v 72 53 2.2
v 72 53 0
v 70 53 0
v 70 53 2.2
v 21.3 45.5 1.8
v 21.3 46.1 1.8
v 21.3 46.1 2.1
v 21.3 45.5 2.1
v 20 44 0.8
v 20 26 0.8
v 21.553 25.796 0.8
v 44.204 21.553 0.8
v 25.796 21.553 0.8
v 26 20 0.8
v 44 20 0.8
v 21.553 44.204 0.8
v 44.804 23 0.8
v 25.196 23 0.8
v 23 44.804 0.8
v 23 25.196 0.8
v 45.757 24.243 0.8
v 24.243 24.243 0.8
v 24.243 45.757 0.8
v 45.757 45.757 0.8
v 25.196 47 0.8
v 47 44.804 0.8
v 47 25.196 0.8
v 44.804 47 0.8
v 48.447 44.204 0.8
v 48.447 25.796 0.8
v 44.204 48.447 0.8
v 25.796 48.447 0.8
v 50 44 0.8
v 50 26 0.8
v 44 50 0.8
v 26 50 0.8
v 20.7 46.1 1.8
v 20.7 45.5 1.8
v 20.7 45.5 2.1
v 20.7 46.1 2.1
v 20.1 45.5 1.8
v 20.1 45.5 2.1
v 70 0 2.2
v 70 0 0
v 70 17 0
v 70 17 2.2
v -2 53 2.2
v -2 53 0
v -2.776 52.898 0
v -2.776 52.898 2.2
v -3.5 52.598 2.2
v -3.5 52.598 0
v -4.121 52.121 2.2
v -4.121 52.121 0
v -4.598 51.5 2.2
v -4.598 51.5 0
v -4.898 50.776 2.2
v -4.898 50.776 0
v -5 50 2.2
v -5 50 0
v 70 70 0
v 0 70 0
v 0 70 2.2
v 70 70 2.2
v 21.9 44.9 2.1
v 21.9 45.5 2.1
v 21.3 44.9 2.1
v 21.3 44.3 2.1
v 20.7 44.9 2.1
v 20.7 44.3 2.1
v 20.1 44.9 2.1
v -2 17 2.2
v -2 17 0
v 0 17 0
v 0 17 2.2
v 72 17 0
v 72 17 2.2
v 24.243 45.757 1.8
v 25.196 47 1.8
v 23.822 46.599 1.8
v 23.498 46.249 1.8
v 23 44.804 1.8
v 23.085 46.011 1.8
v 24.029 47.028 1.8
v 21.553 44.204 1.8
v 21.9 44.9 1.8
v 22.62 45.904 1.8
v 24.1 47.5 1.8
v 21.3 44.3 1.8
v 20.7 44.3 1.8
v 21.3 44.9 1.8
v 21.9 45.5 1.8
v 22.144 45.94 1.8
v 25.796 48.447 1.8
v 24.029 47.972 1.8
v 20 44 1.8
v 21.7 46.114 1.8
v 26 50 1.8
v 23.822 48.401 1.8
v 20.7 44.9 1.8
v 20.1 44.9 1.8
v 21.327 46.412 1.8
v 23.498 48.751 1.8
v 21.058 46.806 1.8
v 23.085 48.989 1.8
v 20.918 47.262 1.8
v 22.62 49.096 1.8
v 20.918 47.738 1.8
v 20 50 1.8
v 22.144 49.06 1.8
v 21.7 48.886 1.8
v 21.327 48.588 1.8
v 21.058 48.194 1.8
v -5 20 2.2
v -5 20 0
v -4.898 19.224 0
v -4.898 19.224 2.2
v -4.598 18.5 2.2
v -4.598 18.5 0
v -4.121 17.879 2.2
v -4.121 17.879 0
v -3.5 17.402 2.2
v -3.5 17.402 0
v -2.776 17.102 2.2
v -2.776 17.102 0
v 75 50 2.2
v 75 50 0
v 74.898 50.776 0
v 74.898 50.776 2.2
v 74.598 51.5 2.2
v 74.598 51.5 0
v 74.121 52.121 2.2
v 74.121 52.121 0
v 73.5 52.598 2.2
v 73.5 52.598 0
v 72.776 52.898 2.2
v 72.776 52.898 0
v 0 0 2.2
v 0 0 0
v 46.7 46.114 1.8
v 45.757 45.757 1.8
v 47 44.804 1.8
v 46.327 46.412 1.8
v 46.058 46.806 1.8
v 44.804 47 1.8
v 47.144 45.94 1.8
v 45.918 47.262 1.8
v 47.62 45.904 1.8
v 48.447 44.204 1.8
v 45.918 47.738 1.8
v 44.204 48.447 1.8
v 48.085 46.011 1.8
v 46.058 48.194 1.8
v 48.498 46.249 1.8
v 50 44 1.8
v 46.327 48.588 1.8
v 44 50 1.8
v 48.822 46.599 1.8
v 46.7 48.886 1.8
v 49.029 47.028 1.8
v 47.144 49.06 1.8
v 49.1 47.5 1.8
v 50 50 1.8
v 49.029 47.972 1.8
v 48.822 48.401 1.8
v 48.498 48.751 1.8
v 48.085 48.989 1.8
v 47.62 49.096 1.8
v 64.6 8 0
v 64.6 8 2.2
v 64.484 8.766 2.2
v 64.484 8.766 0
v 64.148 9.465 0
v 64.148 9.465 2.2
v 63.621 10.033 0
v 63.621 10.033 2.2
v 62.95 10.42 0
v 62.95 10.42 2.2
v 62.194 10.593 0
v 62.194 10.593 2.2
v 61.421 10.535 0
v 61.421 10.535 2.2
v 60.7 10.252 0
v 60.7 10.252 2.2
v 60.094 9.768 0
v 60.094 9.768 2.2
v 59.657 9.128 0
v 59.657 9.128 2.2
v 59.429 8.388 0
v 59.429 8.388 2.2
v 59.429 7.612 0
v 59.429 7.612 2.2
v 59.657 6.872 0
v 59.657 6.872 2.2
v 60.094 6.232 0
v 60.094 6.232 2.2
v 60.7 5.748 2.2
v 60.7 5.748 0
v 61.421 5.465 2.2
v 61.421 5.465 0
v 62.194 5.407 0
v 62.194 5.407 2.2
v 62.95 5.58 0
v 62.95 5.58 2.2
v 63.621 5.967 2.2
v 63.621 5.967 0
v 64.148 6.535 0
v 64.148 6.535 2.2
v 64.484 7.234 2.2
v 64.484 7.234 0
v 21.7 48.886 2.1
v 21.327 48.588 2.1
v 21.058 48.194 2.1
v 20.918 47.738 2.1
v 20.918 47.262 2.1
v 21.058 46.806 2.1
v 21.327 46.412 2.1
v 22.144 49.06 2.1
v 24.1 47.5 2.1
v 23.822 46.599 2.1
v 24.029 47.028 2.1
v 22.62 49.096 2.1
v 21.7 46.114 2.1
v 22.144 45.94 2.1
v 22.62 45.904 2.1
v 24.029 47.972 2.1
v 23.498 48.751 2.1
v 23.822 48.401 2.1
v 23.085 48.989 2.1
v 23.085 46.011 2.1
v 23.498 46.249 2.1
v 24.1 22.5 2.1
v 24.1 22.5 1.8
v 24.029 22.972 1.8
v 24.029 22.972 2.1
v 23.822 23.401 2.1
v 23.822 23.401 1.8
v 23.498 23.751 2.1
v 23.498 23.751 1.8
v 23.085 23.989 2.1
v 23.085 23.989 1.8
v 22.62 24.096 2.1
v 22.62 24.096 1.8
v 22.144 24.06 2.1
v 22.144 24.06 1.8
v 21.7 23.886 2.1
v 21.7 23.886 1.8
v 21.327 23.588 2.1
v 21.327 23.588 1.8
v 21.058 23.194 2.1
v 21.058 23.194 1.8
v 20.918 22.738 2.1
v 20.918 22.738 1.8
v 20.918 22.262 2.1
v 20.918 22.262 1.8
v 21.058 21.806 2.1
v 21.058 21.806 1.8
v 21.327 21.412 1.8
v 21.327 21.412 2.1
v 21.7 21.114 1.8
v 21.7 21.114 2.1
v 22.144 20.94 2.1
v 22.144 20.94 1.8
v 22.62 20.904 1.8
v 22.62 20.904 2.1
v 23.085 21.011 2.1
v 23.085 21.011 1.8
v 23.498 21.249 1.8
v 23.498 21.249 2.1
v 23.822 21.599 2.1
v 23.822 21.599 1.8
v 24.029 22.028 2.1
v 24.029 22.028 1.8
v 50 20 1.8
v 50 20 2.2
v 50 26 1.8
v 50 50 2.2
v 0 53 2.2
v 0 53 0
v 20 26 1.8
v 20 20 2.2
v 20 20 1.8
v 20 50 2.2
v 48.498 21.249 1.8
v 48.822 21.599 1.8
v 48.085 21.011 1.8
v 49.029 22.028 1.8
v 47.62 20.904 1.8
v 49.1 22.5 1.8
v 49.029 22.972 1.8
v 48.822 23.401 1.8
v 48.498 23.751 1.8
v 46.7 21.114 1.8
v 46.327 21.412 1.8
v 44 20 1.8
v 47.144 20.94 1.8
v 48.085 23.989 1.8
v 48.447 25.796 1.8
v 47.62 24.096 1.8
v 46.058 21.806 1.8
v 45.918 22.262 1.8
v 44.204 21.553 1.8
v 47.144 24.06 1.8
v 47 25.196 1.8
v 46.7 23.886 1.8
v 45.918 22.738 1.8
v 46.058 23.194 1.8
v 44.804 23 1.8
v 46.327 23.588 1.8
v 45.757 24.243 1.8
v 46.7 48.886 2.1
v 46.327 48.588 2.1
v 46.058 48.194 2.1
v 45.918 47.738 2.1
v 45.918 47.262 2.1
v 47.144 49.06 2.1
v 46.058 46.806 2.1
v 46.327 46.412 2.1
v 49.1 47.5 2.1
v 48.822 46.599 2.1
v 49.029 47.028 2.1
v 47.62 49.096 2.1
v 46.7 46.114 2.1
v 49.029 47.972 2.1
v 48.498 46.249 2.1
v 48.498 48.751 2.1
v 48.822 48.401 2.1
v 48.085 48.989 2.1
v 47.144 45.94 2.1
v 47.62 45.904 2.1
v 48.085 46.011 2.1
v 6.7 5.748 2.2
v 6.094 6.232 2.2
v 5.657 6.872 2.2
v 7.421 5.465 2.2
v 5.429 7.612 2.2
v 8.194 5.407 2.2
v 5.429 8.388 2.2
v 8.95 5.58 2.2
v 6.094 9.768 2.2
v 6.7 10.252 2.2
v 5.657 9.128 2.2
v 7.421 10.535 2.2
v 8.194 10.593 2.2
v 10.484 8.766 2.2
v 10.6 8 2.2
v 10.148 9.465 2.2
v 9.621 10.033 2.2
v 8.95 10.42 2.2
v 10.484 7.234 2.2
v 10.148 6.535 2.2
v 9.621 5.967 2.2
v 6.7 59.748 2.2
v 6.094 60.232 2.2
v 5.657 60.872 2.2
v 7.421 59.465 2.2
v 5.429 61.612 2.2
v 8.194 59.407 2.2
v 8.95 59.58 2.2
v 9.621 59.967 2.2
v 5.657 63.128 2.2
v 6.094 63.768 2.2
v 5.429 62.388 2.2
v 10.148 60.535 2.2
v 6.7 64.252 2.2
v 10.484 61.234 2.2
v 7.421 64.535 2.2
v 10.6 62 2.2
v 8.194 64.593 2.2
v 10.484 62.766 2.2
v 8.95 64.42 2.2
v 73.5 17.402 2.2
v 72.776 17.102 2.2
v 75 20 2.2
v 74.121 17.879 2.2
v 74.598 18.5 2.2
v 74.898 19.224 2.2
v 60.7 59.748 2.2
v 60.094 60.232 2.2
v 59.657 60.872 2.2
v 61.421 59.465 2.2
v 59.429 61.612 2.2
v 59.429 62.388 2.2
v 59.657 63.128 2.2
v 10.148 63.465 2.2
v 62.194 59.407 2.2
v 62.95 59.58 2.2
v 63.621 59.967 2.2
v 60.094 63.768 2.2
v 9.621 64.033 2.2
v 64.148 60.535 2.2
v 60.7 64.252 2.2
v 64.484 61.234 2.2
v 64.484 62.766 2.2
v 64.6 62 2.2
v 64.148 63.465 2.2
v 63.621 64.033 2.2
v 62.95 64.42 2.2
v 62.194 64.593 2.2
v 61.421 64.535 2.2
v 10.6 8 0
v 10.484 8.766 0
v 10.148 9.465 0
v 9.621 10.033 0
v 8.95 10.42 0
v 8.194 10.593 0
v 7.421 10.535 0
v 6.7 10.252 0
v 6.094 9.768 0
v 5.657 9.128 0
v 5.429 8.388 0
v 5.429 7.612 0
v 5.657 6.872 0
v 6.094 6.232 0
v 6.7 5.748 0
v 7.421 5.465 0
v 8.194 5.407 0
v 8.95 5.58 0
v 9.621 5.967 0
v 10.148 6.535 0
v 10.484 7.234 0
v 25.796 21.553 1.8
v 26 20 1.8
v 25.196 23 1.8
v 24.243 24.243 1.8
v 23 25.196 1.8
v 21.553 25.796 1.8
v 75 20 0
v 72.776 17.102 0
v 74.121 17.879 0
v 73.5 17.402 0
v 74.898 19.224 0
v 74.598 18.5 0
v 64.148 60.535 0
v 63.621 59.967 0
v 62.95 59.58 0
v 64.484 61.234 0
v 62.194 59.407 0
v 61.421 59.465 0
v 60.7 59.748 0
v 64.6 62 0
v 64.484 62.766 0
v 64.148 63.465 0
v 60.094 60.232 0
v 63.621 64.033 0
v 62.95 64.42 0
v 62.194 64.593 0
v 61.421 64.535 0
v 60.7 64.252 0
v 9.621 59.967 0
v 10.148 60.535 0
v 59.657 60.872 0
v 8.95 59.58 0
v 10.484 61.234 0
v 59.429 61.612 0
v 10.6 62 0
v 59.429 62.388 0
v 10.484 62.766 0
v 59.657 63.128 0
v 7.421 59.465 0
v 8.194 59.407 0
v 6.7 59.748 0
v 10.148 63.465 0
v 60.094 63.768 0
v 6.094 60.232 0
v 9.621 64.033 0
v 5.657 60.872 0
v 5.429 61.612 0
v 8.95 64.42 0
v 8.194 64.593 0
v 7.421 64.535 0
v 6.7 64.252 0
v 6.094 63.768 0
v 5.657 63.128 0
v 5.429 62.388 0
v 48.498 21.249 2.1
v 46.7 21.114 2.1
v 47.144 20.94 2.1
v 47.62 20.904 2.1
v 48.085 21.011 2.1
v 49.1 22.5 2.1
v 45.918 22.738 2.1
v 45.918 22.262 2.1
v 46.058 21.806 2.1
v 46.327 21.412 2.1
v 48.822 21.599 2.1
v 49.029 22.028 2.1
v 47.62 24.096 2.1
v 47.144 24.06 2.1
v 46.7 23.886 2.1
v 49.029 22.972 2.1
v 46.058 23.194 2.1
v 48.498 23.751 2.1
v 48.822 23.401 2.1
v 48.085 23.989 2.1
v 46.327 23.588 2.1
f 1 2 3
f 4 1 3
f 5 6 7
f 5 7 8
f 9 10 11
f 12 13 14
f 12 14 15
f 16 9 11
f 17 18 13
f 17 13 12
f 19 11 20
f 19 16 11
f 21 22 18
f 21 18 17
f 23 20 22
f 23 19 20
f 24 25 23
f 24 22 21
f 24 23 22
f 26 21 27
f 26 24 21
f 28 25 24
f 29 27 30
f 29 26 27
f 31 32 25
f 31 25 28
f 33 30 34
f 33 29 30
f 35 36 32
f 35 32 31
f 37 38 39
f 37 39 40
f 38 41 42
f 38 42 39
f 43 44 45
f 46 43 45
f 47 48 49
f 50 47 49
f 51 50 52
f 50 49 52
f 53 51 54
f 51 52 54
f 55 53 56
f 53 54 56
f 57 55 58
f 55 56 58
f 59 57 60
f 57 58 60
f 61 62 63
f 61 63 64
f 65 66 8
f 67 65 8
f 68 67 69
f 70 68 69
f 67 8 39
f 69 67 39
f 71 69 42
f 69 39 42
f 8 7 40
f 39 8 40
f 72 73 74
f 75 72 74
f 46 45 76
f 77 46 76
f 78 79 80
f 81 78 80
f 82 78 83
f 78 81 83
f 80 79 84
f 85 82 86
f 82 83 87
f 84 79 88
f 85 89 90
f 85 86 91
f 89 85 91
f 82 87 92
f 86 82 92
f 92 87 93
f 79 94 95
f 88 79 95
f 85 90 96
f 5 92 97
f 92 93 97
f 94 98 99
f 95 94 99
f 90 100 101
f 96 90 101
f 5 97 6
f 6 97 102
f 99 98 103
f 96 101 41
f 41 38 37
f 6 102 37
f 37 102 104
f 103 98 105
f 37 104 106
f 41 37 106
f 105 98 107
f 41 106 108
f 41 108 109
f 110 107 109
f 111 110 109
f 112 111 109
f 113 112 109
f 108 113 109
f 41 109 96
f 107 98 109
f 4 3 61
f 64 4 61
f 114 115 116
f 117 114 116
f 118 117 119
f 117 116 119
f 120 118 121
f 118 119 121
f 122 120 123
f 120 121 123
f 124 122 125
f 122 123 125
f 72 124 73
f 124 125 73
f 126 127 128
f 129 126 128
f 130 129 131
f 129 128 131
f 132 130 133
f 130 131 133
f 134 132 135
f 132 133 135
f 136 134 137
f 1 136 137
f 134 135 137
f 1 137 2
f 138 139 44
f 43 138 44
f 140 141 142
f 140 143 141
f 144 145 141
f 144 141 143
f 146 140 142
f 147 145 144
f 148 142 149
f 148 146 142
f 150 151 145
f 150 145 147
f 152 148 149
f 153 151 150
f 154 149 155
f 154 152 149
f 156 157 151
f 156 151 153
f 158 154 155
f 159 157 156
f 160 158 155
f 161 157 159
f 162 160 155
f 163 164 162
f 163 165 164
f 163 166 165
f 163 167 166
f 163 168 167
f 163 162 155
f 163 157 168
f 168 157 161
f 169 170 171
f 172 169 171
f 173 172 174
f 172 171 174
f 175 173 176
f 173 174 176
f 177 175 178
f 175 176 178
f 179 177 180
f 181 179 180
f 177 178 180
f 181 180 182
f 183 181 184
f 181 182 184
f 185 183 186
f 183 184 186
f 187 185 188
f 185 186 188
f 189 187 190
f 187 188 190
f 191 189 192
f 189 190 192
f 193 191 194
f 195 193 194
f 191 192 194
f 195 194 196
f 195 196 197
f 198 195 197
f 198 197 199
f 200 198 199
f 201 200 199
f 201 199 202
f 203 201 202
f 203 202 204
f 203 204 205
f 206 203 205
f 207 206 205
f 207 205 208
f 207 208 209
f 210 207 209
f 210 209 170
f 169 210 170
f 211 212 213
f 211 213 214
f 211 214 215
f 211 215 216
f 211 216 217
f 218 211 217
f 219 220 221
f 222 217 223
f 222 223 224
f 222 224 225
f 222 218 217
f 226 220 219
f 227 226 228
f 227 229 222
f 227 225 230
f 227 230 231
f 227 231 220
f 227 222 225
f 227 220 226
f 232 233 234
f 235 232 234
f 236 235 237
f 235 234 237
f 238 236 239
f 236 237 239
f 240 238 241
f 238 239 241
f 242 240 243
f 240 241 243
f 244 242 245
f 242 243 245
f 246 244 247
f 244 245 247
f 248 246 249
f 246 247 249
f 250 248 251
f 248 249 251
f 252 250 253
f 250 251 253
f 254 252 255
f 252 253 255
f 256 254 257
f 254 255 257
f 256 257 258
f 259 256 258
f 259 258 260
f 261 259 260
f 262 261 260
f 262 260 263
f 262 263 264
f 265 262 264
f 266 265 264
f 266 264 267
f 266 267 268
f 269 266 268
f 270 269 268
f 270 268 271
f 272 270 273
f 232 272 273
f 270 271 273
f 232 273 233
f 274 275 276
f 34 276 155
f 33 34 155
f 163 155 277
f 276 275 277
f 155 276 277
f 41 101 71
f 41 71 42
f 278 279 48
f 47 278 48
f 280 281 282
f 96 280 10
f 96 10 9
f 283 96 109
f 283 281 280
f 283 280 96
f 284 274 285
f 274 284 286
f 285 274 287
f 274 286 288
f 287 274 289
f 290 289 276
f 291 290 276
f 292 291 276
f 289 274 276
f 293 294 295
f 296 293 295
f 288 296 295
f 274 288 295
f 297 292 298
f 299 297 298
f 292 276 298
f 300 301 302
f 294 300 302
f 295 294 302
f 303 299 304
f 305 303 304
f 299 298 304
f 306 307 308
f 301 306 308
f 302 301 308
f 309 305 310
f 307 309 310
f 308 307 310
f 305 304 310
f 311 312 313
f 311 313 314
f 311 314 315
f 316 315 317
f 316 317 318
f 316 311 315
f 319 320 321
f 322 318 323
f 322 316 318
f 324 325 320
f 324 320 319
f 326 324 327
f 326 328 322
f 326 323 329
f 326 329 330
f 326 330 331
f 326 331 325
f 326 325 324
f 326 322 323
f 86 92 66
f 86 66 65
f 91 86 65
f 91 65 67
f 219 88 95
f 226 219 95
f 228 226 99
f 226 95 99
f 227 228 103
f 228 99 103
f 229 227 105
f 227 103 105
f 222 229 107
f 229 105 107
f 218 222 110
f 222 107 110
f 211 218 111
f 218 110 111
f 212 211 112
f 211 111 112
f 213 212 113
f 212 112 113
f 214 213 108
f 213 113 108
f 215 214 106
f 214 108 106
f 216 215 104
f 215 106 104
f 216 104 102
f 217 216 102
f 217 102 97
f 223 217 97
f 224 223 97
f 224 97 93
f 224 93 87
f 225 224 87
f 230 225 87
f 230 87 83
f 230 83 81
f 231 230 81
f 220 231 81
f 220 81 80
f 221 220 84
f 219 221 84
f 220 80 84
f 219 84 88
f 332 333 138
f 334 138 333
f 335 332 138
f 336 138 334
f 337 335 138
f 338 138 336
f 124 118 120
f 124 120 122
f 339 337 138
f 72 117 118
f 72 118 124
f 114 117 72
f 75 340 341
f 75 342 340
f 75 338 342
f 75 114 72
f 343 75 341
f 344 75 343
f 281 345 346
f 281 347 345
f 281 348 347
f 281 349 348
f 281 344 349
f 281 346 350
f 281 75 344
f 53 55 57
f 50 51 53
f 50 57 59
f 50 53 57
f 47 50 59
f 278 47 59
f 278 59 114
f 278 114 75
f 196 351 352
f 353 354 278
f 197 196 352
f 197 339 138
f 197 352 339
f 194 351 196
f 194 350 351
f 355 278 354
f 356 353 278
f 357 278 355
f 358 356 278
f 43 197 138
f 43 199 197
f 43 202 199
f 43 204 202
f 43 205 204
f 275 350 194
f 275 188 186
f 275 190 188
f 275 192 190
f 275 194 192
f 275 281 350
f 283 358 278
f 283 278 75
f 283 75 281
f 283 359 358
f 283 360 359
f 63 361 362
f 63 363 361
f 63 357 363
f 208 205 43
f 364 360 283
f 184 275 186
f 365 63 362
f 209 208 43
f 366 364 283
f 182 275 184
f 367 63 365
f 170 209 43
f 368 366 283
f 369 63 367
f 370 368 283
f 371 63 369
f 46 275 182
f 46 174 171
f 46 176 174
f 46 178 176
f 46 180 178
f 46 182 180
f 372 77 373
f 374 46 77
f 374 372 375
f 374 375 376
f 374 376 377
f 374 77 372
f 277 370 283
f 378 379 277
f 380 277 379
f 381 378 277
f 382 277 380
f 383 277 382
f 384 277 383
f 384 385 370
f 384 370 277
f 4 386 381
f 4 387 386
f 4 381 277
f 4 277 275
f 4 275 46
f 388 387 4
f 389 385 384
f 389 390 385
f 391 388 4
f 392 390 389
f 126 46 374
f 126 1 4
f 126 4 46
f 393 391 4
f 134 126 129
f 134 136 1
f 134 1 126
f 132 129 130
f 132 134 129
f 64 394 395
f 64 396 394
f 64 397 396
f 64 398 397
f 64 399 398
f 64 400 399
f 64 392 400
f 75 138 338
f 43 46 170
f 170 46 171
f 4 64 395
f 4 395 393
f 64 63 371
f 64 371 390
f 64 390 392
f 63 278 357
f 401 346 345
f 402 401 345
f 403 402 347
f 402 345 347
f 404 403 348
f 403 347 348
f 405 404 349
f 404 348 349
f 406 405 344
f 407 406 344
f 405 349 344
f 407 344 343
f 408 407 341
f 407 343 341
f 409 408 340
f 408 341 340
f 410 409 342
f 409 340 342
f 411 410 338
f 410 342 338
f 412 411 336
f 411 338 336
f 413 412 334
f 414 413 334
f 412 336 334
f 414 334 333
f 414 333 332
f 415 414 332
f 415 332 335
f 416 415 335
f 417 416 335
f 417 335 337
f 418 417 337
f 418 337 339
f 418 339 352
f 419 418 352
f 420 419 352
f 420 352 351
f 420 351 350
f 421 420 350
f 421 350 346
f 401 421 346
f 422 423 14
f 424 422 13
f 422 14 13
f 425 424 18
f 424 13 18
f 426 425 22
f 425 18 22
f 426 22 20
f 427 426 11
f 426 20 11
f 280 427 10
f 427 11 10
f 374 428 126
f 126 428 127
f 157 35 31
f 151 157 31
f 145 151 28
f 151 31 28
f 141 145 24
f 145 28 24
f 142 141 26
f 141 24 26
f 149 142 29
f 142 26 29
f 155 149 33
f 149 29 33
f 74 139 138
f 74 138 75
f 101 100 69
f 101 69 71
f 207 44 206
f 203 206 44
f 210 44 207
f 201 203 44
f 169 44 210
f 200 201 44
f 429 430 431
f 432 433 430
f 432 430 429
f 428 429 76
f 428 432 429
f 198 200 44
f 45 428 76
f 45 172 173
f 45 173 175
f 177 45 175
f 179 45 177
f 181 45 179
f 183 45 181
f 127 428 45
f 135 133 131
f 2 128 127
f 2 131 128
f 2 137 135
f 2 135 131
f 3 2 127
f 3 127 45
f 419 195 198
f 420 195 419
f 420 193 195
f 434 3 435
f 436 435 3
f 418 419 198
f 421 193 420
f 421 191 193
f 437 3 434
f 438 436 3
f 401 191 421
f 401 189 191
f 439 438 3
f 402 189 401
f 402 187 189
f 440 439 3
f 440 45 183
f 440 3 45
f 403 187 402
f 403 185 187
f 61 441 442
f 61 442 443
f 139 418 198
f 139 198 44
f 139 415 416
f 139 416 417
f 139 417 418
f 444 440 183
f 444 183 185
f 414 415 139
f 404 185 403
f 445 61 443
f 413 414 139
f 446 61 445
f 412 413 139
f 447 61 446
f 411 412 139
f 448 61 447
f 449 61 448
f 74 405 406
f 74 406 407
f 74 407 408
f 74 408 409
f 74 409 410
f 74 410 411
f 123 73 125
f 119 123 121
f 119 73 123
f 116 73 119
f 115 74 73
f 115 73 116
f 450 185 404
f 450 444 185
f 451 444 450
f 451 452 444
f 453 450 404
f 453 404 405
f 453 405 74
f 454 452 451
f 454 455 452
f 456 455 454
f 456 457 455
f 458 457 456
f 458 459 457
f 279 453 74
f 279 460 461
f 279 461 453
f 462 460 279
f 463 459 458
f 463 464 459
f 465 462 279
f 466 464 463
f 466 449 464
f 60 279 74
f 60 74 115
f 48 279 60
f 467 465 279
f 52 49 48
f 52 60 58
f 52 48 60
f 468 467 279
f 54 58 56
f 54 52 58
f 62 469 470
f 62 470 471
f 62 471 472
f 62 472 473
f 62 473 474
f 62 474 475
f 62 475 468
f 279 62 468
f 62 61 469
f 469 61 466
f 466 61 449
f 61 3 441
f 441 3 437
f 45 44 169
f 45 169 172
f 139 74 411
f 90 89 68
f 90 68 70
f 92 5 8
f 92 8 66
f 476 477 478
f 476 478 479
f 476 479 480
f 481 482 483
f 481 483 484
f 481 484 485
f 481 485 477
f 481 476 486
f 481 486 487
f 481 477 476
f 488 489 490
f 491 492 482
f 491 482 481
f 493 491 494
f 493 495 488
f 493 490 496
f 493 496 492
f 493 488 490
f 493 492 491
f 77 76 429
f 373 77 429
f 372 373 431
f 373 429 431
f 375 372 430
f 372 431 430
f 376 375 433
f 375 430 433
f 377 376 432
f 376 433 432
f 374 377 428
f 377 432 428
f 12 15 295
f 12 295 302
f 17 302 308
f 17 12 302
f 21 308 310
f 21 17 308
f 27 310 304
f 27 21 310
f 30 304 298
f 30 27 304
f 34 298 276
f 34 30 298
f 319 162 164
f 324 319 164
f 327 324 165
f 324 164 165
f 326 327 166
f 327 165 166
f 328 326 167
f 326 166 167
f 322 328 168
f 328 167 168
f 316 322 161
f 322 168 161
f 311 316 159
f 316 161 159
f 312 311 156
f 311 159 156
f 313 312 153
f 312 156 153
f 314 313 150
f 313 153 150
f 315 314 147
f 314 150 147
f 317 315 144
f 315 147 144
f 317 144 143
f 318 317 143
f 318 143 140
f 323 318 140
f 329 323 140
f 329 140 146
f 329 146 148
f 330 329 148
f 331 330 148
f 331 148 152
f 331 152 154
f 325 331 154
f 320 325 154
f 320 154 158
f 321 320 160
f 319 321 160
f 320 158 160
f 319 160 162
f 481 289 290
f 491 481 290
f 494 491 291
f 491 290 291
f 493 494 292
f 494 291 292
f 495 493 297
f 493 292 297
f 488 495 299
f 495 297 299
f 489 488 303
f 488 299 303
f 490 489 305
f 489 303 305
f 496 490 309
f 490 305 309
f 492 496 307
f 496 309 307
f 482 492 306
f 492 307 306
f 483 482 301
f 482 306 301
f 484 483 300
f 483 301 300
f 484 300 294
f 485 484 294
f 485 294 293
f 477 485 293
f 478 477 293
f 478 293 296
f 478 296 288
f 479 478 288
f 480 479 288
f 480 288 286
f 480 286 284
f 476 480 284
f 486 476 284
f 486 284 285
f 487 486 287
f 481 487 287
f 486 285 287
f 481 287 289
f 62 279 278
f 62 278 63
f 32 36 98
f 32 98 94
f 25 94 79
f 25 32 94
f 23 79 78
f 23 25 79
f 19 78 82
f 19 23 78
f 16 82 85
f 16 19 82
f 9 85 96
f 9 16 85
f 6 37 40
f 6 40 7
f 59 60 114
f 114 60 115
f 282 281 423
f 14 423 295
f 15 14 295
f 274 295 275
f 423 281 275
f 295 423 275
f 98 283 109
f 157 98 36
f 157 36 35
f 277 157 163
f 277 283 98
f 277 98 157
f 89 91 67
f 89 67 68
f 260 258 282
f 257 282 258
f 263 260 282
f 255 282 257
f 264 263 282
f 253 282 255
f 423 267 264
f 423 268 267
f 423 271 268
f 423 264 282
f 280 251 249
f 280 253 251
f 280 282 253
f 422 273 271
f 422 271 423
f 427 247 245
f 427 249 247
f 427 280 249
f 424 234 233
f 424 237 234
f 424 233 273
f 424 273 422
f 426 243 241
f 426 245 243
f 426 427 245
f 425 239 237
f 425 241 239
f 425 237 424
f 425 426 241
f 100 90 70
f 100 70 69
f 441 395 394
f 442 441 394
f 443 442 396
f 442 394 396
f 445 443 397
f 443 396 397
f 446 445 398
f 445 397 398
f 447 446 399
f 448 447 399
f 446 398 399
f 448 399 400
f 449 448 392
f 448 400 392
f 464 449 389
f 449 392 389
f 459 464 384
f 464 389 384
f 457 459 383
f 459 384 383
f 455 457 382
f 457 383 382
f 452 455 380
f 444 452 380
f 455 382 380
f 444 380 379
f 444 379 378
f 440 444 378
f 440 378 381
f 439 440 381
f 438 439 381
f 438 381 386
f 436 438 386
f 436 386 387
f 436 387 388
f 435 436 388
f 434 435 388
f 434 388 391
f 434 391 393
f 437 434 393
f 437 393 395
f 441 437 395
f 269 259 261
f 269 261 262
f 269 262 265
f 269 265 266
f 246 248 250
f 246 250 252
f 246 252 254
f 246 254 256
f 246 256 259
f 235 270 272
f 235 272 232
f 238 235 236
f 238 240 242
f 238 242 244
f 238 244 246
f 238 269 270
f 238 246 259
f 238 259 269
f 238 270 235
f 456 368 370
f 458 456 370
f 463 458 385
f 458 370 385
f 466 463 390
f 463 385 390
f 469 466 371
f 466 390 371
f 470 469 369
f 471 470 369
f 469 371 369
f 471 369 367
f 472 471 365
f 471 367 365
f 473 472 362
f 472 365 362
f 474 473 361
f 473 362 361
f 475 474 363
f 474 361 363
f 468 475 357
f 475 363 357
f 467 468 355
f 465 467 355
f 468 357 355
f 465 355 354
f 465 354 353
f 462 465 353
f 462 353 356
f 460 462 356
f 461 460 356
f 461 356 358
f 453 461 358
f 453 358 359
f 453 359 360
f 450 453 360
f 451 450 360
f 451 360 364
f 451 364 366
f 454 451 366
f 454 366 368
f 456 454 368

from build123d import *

# Parameters (mm, degrees)
SKETCH_1_W          = 70
SKETCH_1_H          = 70
EXTRUDE_1_DEPTH     = 2.2
SKETCH_2_W          = 30
SKETCH_2_H          = 30
CUT_EXTRUDE_1_DEPTH = 1.4
SKETCH_3_R          = 2.6
CUT_EXTRUDE_2_DEPTH = 3.2
EXTRUDE_2_DEPTH     = 1.8
SKETCH_6_R          = 1.6
EXTRUDE_3_DEPTH     = 0.3


with BuildPart() as part:
    # 草图1 → 凸台-拉伸1 (new body)
    with BuildSketch(Plane.XY):
        with BuildLine():
            Line((-2, 17), (0, 17))
            Line((0, 17), (0, 53))
            Line((0, 53), (-2, 53))
            ThreePointArc((-2, 53), (-4.121320344, 52.121320344), (-5, 50))
            Line((-5, 50), (-5, 20))
            ThreePointArc((-5, 20), (-4.121320344, 17.878679656), (-2, 17))
        make_face()
        with Locations((35, 35)):
            Rectangle(SKETCH_1_W, SKETCH_1_H)
        with BuildLine():
            Line((70, 53), (70, 17))
            Line((70, 17), (72, 17))
            ThreePointArc((72, 17), (74.121320344, 17.878679656), (75, 20))
            Line((75, 20), (75, 50))
            ThreePointArc((75, 50), (74.121320344, 52.121320344), (72, 53))
            Line((72, 53), (70, 53))
        make_face()
    extrude(amount=EXTRUDE_1_DEPTH)

    # 草图2 → 切除-拉伸1 (cut)
    with BuildSketch(Plane.XY.offset(2.2)):
        with Locations((35, 35)):
            Rectangle(SKETCH_2_W, SKETCH_2_H)
    extrude(amount=-CUT_EXTRUDE_1_DEPTH, mode=Mode.SUBTRACT)

    # 草图3 → 切除-拉伸2 (cut, through all)
    with BuildSketch(Plane.XY.offset(2.2)):
        with Locations((8, 62)):
            Circle(SKETCH_3_R)
        with Locations((62, 62)):
            Circle(SKETCH_3_R)
        with Locations((8, 8)):
            Circle(SKETCH_3_R)
        with Locations((62, 8)):
            Circle(SKETCH_3_R)
    extrude(amount=-CUT_EXTRUDE_2_DEPTH, mode=Mode.SUBTRACT)

    # 草图4 → 凸台-拉伸2 (add)
    with BuildSketch(Plane.XY):
        with BuildLine():
            Line((20, 44), (20, 50))
            Line((20, 50), (26, 50))
            ThreePointArc((26, 50), (24.242640687, 45.757359313), (20, 44))
        make_face()
        with BuildLine():
            Line((50, 44), (50, 50))
            Line((50, 50), (44, 50))
            ThreePointArc((44, 50), (45.757359313, 45.757359313), (50, 44))
        make_face()
        with BuildLine():
            Line((50, 20), (44, 20))
            ThreePointArc((44, 20), (45.757359313, 24.242640687), (50, 26))
            Line((50, 26), (50, 20))
        make_face()
        with BuildLine():
            Line((20, 26), (20, 20))
            Line((20, 20), (26, 20))
            ThreePointArc((26, 20), (24.242640687, 24.242640687), (20, 26))
        make_face()
    extrude(amount=EXTRUDE_2_DEPTH)

    # 草图6 → 凸台-拉伸3 (add)
    with BuildSketch(Plane.XY.offset(1.8)):
        with Locations((22.5, 47.5)):
            Circle(SKETCH_6_R)
        with Locations((47.5, 47.5)):
            Circle(SKETCH_6_R)
        with Locations((47.5, 22.5)):
            Circle(SKETCH_6_R)
        with Locations((22.5, 22.5)):
            Circle(SKETCH_6_R)
        Polygon((20.1, 45.5), (20.7, 45.5), (20.7, 46.1), (21.3, 46.1), (21.3, 45.5), (21.9, 45.5), (21.9, 44.9), (21.3, 44.9), (21.3, 44.3), (20.7, 44.3), (20.7, 44.9), (20.1, 44.9), align=None)
    extrude(amount=EXTRUDE_3_DEPTH)


solid = part.part
